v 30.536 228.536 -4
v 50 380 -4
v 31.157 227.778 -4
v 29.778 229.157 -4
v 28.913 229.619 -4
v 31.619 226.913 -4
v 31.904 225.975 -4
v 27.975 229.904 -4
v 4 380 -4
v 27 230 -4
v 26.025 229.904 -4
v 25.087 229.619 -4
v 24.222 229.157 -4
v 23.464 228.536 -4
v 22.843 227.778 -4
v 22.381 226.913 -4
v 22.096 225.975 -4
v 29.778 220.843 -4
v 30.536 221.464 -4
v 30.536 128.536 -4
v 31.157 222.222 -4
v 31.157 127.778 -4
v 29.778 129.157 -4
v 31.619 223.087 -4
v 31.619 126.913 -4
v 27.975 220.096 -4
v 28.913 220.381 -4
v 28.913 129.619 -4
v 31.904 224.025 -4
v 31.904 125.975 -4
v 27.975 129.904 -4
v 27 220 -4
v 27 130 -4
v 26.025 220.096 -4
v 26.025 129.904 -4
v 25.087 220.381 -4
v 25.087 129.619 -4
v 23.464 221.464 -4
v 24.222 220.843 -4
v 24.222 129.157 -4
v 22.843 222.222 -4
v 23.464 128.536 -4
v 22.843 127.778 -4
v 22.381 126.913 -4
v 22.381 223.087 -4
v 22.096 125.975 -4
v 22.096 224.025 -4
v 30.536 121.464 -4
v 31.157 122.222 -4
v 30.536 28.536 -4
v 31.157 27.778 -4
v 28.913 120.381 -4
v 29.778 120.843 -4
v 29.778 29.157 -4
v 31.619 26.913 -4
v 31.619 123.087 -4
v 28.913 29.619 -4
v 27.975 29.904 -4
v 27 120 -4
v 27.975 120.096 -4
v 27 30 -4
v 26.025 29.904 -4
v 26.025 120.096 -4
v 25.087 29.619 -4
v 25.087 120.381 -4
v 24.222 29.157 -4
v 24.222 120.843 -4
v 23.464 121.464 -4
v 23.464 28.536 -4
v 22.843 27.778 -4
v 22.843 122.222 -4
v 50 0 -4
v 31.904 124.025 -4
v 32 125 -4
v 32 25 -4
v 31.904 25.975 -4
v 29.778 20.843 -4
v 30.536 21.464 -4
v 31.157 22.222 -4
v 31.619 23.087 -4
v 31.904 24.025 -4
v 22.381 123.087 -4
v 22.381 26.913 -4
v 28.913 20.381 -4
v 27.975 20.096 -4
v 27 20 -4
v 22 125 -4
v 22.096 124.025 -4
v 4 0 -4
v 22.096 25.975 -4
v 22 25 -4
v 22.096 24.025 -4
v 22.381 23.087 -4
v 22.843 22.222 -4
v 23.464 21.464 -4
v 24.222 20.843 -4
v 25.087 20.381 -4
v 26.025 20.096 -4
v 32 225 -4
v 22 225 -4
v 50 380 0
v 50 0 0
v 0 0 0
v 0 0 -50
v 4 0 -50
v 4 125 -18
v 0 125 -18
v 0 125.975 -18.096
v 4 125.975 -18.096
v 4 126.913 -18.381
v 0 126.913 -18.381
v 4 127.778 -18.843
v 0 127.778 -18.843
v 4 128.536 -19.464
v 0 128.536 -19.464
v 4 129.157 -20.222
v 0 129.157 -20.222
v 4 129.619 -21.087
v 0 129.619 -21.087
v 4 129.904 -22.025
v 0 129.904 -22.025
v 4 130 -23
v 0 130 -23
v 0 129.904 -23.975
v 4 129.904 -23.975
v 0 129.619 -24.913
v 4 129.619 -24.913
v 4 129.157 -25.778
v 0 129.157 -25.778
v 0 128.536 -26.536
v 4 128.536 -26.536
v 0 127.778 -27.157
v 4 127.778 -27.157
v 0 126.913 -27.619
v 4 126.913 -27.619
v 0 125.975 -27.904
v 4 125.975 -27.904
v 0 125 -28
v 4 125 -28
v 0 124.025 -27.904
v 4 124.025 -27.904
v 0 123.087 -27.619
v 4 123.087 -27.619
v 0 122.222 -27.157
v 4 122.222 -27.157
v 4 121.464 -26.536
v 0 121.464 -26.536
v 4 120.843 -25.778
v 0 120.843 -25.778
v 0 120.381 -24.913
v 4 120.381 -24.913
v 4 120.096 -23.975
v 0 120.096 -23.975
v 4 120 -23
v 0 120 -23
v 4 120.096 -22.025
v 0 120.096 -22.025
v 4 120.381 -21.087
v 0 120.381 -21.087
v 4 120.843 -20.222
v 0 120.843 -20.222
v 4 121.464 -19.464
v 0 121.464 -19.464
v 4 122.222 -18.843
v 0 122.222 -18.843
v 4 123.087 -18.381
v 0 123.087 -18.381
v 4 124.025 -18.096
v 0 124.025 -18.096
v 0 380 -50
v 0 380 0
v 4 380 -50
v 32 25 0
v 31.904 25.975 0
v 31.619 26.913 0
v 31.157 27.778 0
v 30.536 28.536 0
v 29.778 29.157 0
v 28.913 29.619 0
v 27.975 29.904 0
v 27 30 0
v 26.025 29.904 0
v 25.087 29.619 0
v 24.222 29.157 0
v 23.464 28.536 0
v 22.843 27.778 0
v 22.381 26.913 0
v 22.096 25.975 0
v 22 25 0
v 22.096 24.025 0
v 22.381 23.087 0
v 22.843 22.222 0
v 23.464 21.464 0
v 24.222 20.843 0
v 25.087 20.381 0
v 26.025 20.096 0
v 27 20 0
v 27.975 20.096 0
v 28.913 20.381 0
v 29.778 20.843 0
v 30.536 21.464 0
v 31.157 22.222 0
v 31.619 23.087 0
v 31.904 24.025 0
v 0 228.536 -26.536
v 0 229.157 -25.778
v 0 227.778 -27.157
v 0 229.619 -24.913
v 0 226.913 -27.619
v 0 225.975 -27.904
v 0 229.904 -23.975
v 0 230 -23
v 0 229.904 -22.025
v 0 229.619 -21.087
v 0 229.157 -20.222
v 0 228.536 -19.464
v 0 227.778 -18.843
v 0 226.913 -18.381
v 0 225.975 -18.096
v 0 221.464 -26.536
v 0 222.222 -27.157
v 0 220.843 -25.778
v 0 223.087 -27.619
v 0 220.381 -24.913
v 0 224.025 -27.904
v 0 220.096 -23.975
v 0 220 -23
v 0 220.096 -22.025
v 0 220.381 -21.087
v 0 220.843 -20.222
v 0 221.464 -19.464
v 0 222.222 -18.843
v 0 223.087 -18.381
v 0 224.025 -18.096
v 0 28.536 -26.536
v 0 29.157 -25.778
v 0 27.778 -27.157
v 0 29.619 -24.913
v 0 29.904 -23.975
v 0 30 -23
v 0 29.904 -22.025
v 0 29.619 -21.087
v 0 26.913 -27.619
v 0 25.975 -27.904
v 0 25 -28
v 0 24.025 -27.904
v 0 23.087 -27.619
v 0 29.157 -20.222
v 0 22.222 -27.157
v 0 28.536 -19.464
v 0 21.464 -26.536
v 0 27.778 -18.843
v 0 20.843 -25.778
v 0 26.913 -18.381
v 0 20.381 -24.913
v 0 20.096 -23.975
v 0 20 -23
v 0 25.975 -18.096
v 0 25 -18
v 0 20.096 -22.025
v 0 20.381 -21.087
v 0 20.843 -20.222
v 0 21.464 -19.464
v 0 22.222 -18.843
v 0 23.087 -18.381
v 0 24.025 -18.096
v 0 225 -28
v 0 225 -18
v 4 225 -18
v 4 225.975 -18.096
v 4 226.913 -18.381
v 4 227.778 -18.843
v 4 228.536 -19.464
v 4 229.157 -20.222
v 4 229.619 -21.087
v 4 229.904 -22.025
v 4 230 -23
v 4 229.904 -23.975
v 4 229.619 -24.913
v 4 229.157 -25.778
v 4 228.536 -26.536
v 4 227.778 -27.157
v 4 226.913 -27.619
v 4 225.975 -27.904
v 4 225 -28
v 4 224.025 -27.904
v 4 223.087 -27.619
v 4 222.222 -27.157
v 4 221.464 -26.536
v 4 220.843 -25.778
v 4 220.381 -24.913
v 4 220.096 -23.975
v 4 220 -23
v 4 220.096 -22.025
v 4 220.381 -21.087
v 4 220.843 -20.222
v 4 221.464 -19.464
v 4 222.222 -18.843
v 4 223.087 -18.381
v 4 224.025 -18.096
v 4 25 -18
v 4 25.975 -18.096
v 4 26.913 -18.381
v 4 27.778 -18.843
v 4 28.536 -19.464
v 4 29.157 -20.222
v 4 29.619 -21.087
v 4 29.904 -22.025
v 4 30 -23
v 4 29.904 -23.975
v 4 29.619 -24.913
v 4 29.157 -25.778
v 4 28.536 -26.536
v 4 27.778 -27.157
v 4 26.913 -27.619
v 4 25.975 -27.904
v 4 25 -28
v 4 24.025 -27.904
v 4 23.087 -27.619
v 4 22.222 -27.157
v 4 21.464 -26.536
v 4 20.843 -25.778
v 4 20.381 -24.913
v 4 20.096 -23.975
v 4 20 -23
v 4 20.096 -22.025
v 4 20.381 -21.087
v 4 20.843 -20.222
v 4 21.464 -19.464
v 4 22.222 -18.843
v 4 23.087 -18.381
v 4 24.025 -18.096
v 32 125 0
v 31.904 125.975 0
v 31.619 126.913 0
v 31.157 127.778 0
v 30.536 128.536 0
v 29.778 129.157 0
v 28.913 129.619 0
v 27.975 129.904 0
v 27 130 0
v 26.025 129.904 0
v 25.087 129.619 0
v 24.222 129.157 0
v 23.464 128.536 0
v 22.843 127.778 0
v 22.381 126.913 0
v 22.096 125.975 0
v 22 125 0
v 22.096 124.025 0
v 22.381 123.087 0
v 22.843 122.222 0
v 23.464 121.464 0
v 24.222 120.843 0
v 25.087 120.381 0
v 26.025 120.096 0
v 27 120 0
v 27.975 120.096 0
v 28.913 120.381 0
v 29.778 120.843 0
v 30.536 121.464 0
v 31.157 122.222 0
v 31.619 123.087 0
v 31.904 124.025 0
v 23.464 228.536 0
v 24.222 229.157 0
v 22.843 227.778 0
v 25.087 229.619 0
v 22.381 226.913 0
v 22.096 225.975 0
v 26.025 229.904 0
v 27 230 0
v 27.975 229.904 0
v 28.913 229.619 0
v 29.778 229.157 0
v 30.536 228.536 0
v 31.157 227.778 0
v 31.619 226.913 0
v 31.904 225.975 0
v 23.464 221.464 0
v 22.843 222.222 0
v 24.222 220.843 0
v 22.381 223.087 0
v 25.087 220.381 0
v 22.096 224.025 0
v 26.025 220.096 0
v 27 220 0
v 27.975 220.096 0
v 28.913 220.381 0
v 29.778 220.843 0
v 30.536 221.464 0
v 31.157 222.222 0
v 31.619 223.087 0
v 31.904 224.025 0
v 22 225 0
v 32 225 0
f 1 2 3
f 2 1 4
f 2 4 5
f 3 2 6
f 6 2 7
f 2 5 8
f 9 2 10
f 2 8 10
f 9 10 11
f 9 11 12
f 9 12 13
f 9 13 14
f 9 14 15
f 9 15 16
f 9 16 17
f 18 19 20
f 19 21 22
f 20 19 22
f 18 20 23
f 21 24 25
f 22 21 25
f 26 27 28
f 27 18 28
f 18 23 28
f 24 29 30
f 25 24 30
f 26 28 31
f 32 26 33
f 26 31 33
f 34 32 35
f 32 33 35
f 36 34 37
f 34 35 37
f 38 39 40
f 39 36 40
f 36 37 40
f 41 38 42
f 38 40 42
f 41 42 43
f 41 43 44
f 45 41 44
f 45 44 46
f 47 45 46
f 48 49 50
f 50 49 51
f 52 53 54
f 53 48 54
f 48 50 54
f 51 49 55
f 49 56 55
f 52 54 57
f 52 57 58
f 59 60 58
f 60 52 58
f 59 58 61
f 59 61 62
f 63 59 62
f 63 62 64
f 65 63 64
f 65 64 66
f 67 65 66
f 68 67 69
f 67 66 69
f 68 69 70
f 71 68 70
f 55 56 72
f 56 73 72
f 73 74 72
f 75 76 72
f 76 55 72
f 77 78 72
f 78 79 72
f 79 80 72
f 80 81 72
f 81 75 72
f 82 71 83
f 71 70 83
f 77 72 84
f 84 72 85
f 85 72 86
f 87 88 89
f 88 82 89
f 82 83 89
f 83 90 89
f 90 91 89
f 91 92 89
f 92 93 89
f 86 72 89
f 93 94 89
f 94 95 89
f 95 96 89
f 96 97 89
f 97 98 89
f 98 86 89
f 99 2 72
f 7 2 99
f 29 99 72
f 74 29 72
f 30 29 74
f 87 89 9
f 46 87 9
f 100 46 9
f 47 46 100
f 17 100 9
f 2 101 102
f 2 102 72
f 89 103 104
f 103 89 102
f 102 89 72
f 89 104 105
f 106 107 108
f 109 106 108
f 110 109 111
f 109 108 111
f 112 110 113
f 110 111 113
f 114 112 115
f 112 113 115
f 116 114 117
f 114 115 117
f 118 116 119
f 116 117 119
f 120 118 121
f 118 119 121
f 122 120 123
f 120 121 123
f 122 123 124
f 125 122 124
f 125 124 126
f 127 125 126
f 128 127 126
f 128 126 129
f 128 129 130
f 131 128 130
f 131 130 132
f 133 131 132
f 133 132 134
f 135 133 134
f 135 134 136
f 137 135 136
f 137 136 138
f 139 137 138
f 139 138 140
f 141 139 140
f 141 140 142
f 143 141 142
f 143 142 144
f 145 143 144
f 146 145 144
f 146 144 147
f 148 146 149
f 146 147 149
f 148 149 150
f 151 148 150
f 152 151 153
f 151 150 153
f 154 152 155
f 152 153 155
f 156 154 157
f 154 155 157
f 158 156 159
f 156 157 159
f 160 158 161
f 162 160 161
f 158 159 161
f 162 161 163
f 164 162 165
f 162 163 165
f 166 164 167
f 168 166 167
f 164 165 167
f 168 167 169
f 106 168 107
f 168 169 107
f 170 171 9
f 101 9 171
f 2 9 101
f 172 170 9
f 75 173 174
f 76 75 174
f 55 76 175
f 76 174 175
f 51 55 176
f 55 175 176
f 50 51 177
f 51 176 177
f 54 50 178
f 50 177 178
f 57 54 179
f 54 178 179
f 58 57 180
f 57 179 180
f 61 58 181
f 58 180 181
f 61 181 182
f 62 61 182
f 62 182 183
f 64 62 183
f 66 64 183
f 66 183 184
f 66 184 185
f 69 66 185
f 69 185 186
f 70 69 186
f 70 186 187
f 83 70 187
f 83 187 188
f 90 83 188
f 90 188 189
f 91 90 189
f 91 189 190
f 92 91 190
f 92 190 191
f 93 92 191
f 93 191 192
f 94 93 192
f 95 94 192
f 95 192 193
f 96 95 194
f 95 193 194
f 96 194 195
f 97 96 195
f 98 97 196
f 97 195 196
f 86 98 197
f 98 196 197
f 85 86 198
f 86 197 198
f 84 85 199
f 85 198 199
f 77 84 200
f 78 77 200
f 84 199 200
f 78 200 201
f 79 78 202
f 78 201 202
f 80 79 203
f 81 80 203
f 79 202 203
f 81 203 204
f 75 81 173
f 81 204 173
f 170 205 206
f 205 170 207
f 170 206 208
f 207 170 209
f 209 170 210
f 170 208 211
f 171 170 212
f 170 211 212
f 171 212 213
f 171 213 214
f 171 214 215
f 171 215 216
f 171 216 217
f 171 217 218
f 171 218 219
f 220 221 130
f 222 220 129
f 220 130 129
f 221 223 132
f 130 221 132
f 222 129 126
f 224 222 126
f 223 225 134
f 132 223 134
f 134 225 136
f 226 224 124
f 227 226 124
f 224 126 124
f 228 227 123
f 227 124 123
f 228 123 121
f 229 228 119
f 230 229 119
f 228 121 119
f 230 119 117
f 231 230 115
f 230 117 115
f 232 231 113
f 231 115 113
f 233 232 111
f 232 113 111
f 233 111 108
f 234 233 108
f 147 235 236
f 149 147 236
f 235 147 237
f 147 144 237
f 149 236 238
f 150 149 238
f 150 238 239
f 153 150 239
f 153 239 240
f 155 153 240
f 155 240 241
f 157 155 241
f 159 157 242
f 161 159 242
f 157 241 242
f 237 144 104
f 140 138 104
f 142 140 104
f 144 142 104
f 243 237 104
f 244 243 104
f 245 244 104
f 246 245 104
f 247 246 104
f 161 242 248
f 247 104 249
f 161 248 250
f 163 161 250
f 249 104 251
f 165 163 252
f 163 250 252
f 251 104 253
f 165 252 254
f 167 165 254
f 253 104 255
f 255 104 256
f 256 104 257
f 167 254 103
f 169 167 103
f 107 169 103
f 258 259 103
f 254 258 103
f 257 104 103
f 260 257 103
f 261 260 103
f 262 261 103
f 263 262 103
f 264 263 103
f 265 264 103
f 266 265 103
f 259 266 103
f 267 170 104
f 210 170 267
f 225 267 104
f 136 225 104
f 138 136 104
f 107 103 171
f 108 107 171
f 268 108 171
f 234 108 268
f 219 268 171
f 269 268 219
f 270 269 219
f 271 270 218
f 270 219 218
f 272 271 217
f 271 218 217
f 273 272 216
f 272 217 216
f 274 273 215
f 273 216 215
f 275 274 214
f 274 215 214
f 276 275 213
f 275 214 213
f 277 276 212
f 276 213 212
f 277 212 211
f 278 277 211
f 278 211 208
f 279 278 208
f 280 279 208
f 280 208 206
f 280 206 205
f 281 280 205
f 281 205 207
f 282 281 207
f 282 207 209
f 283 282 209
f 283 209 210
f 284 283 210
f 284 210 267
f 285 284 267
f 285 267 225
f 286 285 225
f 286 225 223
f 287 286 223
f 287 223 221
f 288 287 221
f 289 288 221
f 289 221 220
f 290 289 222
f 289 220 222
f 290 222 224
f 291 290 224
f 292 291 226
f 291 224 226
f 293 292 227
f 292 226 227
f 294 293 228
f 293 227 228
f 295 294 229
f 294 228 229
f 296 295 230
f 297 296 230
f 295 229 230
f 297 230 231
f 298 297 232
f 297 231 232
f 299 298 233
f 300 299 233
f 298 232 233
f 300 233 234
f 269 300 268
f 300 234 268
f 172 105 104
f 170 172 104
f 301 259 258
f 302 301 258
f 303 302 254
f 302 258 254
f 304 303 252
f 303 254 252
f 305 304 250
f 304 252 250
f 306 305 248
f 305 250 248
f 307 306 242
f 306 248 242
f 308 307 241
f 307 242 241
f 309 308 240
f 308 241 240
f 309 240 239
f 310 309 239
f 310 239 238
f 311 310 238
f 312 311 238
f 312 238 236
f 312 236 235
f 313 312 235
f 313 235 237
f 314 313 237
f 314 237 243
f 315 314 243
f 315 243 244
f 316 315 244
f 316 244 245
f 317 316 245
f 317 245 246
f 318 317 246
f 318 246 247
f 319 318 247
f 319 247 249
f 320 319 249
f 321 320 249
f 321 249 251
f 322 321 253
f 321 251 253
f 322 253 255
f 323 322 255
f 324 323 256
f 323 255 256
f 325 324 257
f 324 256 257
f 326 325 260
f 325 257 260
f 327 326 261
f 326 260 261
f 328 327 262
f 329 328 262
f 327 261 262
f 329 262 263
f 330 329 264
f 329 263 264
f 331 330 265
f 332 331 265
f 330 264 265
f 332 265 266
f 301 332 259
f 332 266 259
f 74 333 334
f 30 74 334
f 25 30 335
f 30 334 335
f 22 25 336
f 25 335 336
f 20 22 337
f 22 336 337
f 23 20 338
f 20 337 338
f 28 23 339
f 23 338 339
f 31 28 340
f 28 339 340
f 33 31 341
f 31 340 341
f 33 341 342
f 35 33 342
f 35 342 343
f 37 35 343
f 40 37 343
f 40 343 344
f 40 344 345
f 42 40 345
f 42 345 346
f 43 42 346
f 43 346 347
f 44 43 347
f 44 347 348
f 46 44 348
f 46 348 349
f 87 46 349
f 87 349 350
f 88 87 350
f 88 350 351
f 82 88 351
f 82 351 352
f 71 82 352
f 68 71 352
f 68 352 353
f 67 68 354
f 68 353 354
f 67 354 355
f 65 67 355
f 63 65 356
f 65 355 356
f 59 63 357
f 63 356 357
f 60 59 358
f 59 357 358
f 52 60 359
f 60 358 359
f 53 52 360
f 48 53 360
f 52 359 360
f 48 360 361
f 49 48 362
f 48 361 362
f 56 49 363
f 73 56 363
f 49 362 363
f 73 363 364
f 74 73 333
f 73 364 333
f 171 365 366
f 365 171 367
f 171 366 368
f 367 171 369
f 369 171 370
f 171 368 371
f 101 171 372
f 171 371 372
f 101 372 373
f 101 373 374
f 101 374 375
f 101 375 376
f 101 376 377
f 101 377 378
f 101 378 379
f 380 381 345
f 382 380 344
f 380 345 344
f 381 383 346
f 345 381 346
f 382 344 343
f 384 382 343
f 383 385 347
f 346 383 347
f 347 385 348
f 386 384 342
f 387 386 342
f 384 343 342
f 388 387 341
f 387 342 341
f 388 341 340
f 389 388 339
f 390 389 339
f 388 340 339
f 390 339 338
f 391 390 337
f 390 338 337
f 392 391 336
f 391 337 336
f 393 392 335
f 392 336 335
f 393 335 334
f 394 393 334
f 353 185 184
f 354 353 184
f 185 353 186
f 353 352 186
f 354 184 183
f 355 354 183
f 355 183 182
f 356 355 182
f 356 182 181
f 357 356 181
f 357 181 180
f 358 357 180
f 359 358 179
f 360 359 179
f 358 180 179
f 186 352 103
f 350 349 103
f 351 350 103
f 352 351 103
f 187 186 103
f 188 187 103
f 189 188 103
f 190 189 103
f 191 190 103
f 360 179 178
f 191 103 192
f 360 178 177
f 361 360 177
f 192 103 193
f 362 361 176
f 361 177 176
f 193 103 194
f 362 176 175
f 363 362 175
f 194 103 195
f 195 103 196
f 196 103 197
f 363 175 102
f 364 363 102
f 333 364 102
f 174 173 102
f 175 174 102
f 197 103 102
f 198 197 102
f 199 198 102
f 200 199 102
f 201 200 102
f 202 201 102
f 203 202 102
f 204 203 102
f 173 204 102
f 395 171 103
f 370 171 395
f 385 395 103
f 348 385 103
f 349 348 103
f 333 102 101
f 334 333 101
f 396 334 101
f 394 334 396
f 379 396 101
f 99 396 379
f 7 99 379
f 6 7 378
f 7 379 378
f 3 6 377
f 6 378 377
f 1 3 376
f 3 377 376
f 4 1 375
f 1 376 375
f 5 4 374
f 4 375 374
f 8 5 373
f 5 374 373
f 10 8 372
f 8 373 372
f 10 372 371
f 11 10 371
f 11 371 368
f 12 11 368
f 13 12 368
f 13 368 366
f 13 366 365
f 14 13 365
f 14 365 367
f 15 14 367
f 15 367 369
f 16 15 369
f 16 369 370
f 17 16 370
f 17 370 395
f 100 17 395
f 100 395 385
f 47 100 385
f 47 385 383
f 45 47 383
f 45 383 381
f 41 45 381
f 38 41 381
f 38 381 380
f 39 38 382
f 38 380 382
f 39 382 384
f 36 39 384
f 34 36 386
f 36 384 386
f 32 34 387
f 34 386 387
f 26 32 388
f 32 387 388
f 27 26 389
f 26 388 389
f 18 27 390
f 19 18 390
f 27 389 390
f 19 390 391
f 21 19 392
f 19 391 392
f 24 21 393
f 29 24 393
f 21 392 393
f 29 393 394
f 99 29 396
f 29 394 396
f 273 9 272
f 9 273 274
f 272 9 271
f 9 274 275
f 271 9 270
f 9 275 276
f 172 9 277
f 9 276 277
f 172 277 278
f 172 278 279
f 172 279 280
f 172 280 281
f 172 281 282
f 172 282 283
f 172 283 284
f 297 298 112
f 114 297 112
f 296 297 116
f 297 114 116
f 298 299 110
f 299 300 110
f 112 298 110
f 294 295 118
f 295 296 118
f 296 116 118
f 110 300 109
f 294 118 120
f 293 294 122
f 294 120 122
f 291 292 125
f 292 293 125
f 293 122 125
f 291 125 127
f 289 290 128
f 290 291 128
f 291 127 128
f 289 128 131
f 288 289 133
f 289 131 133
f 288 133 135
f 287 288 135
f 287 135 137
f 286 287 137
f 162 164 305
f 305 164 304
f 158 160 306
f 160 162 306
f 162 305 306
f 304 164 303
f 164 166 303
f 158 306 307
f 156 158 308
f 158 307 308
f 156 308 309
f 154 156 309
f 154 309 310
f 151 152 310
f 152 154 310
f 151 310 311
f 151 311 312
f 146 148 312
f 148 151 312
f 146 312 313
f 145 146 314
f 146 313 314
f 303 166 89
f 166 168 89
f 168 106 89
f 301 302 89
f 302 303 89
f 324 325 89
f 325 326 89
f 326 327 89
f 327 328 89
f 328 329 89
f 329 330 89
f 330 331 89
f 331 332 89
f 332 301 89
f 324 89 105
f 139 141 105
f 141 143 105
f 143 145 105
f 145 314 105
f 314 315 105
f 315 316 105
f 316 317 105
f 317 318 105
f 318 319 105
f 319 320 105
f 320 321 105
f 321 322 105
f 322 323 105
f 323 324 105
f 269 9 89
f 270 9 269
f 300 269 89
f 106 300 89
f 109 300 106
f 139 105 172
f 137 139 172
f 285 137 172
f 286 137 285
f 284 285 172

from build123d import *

# Parameters (mm, degrees)
EXTRUDE_1_DEPTH     = 380
SKETCH_2_R          = 5
CUT_EXTRUDE_1_DEPTH = 10
SKETCH_3_R          = 5
CUT_EXTRUDE_2_DEPTH = 10


with BuildPart() as part:
    # Эскиз1 → Вытянуть-Тонкостенный1 (new body)
    with BuildSketch(Plane(origin=(0, 0, 0), x_dir=(1, 0, 0), z_dir=(0, 1, 0))):
        Polygon((0, 50), (0, 0), (50, 0), (50, 4), (4, 4), (4, 50), align=None)
    extrude(amount=EXTRUDE_1_DEPTH)

    # Эскиз2 → Вырез-Вытянуть1 (cut)
    with BuildSketch(Plane.XY):
        with Locations((27, 225)):
            Circle(SKETCH_2_R)
        with Locations((27, 125)):
            Circle(SKETCH_2_R)
        with Locations((27, 25)):
            Circle(SKETCH_2_R)
    extrude(amount=-CUT_EXTRUDE_1_DEPTH, mode=Mode.SUBTRACT)

    # Эскиз3 → Вырез-Вытянуть2 (cut)
    with BuildSketch(Plane.ZY):
        with Locations((-23, 225)):
            Circle(SKETCH_3_R)
        with Locations((-23, 125)):
            Circle(SKETCH_3_R)
        with Locations((-23, 25)):
            Circle(SKETCH_3_R)
    extrude(amount=-CUT_EXTRUDE_2_DEPTH, mode=Mode.SUBTRACT)


solid = part.part
